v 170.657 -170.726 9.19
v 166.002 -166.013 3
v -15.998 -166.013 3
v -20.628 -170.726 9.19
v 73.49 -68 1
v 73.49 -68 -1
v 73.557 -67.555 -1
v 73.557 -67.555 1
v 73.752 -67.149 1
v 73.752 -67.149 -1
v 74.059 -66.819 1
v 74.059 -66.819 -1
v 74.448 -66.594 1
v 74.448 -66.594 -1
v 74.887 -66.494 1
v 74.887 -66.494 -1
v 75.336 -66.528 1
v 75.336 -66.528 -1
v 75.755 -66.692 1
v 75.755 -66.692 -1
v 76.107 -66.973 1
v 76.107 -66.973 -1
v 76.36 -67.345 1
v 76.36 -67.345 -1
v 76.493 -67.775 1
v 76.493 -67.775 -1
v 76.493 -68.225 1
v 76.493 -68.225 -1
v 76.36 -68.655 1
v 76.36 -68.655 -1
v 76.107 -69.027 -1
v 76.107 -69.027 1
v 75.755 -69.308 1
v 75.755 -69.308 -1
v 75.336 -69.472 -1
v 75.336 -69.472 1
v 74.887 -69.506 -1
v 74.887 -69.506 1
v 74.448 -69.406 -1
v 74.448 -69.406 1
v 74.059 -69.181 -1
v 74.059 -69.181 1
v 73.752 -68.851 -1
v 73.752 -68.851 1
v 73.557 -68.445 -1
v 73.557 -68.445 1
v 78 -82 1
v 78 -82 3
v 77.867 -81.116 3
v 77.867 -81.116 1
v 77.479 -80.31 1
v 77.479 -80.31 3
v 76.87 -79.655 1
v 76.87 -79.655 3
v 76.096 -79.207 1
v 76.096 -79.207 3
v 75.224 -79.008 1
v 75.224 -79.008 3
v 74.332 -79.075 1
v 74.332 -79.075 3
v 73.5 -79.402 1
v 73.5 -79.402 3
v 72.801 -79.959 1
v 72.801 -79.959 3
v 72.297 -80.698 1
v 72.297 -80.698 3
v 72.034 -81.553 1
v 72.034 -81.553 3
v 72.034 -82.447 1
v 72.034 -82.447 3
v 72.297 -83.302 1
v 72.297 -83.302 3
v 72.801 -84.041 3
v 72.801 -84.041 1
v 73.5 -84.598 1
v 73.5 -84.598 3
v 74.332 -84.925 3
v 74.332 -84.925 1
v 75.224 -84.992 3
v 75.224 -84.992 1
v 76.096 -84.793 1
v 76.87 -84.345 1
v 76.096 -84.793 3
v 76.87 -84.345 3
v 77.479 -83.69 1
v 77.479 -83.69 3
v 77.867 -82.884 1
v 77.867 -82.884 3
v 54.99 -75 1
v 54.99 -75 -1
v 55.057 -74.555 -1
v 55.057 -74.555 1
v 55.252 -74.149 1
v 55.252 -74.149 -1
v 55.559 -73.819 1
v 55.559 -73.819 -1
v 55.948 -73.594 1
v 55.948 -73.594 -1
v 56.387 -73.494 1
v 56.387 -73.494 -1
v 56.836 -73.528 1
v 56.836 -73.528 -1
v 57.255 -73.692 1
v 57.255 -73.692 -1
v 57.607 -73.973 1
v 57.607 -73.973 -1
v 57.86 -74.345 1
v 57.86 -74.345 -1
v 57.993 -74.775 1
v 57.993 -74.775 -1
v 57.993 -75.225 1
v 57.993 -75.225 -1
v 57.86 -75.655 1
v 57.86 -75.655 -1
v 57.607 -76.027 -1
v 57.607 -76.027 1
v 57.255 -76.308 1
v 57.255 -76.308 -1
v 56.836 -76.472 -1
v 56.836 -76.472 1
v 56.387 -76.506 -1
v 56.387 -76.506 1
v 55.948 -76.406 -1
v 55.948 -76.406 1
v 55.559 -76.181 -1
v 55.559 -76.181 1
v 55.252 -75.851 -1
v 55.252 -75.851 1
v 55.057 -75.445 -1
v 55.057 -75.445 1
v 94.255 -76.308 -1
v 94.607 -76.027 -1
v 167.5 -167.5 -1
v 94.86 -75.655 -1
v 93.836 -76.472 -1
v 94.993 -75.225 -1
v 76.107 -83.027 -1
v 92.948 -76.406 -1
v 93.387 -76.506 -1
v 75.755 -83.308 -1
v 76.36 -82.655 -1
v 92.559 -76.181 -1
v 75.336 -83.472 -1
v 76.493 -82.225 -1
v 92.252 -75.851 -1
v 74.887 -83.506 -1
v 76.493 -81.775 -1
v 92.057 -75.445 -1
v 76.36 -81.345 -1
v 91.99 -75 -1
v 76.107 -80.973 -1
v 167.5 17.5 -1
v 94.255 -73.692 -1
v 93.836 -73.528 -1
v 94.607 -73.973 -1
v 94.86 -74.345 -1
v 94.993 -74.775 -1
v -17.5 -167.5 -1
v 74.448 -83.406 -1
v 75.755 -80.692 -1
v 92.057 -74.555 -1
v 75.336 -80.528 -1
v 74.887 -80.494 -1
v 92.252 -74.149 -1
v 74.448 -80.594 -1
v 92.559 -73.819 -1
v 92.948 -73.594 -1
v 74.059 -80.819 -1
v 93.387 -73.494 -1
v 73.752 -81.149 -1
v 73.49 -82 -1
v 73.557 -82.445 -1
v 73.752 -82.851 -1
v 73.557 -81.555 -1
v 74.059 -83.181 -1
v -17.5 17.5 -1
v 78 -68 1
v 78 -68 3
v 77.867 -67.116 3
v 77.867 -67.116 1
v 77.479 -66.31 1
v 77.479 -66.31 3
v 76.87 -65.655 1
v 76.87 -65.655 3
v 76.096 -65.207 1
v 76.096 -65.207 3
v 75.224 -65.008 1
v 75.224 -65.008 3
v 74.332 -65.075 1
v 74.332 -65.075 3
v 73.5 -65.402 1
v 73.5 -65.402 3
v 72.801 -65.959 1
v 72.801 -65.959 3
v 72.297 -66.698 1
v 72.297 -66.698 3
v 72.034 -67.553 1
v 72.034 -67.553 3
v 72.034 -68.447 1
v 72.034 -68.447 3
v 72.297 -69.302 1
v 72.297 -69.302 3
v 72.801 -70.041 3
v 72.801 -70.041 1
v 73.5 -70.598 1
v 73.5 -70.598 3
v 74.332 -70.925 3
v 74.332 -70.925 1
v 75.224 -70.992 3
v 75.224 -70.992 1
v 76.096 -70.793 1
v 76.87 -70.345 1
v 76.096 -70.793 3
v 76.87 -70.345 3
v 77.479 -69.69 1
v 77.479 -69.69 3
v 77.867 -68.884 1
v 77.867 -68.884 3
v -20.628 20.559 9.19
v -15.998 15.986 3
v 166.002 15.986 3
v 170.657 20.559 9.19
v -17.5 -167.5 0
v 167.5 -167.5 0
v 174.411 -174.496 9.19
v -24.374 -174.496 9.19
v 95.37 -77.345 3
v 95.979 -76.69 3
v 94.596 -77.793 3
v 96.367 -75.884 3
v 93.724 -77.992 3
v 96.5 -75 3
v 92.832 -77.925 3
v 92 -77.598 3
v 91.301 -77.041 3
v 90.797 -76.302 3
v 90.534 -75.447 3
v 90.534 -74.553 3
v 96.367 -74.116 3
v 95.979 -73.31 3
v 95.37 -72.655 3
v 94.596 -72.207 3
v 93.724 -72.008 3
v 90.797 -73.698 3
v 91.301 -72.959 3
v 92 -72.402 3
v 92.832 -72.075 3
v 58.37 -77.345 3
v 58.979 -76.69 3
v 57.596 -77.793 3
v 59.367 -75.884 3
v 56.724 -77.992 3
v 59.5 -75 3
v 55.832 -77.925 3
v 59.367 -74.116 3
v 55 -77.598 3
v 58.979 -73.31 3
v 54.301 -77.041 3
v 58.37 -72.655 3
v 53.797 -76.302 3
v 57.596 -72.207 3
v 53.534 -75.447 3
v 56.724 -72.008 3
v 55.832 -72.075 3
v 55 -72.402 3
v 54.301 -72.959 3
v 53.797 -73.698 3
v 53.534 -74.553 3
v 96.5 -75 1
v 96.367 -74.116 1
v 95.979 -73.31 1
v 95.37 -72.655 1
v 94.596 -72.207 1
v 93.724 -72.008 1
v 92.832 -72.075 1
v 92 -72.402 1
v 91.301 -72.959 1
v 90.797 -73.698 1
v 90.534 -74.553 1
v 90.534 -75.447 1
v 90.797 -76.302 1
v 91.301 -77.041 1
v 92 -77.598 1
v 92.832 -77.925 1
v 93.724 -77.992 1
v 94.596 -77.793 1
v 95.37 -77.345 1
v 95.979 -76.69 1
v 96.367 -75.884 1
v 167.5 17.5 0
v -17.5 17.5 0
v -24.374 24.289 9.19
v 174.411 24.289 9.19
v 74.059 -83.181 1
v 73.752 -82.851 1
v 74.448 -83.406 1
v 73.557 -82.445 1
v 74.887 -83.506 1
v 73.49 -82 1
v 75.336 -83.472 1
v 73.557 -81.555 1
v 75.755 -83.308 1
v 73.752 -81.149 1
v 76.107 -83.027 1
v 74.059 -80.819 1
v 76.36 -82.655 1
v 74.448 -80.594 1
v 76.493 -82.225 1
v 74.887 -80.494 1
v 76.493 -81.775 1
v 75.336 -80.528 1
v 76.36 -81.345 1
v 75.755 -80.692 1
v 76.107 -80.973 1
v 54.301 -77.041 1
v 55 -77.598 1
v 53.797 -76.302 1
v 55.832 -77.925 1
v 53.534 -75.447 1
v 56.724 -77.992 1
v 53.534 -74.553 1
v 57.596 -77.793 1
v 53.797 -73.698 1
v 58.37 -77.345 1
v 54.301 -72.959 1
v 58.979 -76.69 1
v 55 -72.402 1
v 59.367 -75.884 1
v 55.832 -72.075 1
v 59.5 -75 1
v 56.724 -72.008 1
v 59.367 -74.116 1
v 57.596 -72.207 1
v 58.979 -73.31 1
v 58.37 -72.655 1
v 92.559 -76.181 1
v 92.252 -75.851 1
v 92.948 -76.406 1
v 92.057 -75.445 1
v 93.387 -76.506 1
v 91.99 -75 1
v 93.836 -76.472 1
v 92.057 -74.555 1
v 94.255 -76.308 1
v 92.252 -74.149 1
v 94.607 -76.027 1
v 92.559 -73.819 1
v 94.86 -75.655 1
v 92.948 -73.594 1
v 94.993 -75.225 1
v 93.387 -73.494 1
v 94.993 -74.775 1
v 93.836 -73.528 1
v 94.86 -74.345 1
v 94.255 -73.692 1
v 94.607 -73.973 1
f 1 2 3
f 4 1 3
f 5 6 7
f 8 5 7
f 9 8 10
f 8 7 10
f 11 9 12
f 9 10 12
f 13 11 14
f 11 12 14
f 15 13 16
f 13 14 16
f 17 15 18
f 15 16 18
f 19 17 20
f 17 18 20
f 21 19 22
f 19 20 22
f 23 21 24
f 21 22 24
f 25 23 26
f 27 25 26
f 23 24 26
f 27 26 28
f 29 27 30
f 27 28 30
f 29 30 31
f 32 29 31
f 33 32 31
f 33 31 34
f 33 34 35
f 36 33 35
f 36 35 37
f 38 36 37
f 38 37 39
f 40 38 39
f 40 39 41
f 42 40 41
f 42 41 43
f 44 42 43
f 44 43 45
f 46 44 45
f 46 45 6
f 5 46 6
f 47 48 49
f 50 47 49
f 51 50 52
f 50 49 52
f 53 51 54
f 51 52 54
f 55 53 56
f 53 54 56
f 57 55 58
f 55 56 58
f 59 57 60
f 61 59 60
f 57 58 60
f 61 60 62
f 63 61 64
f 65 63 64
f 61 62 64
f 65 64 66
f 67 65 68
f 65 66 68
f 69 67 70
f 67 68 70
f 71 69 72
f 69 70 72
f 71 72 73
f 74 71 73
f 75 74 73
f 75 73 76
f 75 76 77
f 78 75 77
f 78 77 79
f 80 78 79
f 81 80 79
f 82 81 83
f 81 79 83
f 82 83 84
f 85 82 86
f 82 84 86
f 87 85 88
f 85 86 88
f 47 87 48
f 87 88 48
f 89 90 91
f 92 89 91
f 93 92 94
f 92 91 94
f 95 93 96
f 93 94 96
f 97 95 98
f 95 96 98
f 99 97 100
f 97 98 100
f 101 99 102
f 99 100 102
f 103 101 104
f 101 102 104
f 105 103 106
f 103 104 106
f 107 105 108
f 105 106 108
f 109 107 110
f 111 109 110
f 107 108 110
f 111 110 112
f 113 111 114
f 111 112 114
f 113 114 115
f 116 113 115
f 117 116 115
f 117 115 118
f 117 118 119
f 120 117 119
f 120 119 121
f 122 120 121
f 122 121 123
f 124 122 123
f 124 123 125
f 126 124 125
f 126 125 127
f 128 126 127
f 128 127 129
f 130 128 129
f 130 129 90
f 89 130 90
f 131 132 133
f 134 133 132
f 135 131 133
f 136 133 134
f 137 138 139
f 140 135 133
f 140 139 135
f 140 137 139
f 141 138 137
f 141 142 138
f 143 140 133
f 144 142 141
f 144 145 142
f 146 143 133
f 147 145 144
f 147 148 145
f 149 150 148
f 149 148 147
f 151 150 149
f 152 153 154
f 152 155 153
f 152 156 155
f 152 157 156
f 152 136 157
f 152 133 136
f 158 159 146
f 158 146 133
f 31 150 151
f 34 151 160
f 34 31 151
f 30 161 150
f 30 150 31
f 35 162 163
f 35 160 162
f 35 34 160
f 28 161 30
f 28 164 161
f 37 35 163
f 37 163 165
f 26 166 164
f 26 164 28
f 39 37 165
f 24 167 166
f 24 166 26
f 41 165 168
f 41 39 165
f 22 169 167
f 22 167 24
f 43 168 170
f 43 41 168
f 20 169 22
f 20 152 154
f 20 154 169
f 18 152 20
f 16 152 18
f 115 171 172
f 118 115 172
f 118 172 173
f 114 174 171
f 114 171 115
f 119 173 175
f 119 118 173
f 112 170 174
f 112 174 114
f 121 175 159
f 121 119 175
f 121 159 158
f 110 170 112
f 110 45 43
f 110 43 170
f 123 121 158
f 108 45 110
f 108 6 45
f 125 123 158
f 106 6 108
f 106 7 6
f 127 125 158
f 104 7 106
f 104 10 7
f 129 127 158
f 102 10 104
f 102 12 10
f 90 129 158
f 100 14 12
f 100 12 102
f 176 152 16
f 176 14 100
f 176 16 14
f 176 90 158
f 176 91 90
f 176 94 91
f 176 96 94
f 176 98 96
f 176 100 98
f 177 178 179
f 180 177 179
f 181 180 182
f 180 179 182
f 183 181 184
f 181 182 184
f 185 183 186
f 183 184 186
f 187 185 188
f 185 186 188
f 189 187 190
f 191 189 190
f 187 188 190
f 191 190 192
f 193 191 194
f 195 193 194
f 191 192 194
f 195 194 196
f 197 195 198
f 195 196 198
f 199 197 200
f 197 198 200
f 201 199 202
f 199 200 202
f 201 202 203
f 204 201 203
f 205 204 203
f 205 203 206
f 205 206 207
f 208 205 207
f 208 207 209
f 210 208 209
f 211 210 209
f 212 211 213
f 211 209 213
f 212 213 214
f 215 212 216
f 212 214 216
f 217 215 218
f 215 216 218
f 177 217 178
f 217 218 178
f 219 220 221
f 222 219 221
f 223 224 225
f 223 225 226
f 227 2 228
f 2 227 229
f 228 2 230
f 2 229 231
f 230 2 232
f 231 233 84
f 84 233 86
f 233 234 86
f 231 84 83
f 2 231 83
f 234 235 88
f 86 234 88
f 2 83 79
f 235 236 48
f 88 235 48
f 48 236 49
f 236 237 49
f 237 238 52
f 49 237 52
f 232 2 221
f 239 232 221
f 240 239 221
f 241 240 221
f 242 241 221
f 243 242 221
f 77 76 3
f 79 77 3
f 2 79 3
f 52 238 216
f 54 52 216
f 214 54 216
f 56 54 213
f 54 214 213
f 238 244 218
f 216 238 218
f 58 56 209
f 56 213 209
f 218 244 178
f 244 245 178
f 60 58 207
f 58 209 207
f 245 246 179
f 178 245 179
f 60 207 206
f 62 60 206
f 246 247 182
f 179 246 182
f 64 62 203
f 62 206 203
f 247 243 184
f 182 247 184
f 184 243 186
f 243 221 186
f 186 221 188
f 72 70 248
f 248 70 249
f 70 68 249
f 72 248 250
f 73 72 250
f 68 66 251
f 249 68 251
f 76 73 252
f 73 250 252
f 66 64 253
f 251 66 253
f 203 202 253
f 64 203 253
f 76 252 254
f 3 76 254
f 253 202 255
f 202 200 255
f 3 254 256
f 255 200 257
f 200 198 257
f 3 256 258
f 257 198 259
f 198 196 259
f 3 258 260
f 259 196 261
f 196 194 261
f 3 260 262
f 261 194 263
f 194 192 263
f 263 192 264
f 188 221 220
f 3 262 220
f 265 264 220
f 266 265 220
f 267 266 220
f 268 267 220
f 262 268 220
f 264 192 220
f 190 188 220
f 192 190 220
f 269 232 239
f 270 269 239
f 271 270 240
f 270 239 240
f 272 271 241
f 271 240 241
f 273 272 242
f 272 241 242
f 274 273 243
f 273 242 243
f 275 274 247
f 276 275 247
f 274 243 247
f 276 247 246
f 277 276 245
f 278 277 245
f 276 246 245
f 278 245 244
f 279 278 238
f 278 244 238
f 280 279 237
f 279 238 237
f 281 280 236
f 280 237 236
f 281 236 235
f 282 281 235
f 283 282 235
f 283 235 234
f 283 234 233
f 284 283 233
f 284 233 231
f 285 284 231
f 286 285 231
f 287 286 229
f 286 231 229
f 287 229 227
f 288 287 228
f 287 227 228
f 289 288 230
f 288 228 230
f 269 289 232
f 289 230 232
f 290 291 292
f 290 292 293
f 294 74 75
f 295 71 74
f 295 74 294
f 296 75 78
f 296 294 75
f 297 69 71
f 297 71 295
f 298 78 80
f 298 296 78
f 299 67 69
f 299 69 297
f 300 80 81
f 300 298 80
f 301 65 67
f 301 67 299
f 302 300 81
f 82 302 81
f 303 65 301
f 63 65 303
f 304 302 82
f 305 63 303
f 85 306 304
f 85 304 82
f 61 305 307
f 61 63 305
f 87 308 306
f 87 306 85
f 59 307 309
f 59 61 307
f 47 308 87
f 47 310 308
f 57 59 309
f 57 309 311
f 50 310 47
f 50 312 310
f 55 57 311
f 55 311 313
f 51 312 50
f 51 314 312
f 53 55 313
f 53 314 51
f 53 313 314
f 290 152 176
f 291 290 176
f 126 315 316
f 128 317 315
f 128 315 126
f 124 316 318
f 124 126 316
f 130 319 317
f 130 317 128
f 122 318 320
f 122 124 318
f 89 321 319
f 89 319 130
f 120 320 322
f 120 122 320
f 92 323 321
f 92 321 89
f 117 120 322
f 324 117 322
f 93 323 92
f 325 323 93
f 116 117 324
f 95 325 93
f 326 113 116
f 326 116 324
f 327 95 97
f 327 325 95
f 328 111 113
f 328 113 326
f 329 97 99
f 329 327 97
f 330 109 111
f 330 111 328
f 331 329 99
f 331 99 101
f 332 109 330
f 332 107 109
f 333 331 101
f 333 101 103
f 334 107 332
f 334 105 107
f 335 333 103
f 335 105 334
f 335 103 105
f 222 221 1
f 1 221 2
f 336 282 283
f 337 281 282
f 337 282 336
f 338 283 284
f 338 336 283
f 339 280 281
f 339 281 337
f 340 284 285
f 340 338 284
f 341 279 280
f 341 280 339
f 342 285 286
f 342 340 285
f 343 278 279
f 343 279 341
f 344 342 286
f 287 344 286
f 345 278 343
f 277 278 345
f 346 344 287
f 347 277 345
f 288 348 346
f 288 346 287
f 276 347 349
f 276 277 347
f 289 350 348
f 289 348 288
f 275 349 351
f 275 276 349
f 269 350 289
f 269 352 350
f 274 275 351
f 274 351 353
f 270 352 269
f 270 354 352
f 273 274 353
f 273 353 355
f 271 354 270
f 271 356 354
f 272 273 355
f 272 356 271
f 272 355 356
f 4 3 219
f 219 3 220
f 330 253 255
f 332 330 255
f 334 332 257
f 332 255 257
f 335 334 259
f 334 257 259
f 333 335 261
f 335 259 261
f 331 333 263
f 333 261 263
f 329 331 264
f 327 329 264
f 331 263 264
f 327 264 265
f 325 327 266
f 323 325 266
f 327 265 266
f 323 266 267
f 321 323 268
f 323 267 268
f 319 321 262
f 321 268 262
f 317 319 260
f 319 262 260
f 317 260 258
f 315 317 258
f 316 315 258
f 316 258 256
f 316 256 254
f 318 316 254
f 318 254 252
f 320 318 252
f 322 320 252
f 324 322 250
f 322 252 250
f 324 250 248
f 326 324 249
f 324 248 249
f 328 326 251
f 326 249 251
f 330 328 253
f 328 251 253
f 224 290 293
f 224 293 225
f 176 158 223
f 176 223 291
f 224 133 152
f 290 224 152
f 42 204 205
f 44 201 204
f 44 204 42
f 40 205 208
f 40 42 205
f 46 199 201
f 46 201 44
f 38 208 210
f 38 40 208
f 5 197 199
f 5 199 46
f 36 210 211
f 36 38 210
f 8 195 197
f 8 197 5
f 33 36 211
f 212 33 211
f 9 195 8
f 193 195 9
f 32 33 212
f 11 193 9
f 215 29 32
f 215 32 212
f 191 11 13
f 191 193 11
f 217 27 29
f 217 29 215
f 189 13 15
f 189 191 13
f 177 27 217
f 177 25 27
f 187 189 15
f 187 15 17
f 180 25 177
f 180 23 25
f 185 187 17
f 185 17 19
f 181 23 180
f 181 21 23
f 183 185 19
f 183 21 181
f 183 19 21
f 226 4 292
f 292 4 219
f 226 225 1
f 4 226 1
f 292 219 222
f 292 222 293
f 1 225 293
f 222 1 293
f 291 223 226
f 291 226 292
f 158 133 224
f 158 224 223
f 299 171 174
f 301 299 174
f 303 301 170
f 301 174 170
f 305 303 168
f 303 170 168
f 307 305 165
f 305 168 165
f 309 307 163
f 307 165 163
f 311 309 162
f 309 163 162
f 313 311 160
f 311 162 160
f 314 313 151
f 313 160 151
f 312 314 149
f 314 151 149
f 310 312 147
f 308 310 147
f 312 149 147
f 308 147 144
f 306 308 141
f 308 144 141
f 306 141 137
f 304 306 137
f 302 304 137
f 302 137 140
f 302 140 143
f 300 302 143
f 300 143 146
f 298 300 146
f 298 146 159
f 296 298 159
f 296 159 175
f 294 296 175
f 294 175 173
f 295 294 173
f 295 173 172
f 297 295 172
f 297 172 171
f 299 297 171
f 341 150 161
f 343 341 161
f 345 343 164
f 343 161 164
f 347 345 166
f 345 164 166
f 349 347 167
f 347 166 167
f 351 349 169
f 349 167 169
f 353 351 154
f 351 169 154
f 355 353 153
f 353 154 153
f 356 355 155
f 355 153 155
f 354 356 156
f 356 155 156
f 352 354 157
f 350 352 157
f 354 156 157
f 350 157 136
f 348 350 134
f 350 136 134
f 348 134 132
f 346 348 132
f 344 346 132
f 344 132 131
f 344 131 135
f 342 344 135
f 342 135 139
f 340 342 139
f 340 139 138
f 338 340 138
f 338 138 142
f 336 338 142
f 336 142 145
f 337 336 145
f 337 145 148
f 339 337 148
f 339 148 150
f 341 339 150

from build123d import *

# Parameters (mm, degrees)
SHELL_2_T            = -3
SKETCH_4_R           = 1.5
CUT_EXTRUDE_1_DEPTH  = 10
EXTRUDE_1_DEPTH      = 40.5
CUT_EXTRUDE_2_DEPTH  = 100
SKETCH_8_R           = 1.5
EXTRUDE_2_DEPTH      = 3
EXTRUDE_3_DEPTH      = 4
EXTRUDE_4_DEPTH      = 4
SKETCH_11_W          = 56.2
SKETCH_11_H          = 25
CUT_EXTRUDE_3_DEPTH  = 4
SKETCH_12_W          = 3
SKETCH_12_H          = 215
EXTRUDE_5_DEPTH      = 10
SKETCH_13_W          = 10
SKETCH_13_H          = 215
CUT_EXTRUDE_4_DEPTH  = 300
SKETCH_15_W          = 116.702064096
SKETCH_15_H          = 65.174269722
SKETCH_15_W_2        = 111.85
SKETCH_15_H_2        = 80
CUT_EXTRUDE_5_DEPTH  = 4
SKETCH_16_W          = 185
SKETCH_16_H          = 185
EXTRUDE_6_DEPTH      = 4
SKETCH_17_W          = 56.2
SKETCH_17_H          = 25
CUT_EXTRUDE_6_DEPTH  = 4
EXTRUDE_7_DEPTH      = 4
SKETCH_20_R          = 1.5
CUT_EXTRUDE_7_DEPTH  = 10
SKETCH_21_W          = 185
SKETCH_21_H          = 185
CUT_EXTRUDE_8_DEPTH  = 37.5
EXTRUDE_START        = 1
SKETCH_22_W          = 185
SKETCH_22_H          = 185
SKETCH_22_R          = 1.5
EXTRUDE_8_DEPTH      = 1
CUT_EXTRUDE_START    = -2
SKETCH_24_R          = 3
SKETCH_24_R_2        = 1.5
CUT_EXTRUDE_9_DEPTH  = 2
SKETCH_25_R          = 1.51
CUT_EXTRUDE_10_DEPTH = 10
SKETCH_26_R          = 1.5
EXTRUDE_9_DEPTH      = 4
EXTRUDE_START_2      = -4
SKETCH_28_R          = 3
EXTRUDE_10_DEPTH     = 4
SKETCH_29_R          = 3
CUT_EXTRUDE_11_DEPTH = 2
CUT_EXTRUDE_12_DEPTH = 10
CUT_EXTRUDE_13_DEPTH = 10
CUT_EXTRUDE_14_DEPTH = 10
CUT_EXTRUDE_15_DEPTH = 10
CUT_EXTRUDE_19_DEPTH = 200
CUT_EXTRUDE_20_DEPTH = 200


with BuildPart() as part:
    # 草图3 → 放样1 section 0
    with BuildSketch(Plane.XY.offset(20)):
        with BuildLine():
            Line((-32.460246779, 32.274755465), (182.539753221, 32.274755465))
            Line((182.539753221, 32.274755465), (182.539753221, -182.725244535))
            Line((182.539753221, -182.725244535), (-32.460246779, -182.725244535))
            Line((-32.460246779, -182.725244535), (-32.460246779, 32.274755465))
        make_face()
    # 草图1 → 放样1 section 1
    with BuildSketch(Plane.XY):
        with BuildLine():
            Line((-17.5, -167.5), (167.5, -167.5))
            Line((167.5, -167.5), (167.5, 17.5))
            Line((167.5, 17.5), (-17.5, 17.5))
            Line((-17.5, 17.5), (-17.5, -167.5))
        make_face()
    loft()

    # 抽壳2
    shell_2_openings = [part.faces().sort_by_distance(p)[0] for p in [
        (75.039753221, -75.225244535, 20),
    ]]
    offset(amount=SHELL_2_T, openings=shell_2_openings, kind=Kind.INTERSECTION)

    # 草图4 → 切除-拉伸1 (cut)
    with BuildSketch(Plane.XY.offset(3)):
        with BuildLine():
            ThreePointArc((86.25, -75.225244535), (84.75, -73.725244535), (83.25, -75.225244535))
            Line((83.25, -75.225244535), (86.25, -75.225244535))
        make_face()
        with BuildLine():
            Line((86.25, -75.225244535), (83.25, -75.225244535))
            ThreePointArc((83.25, -75.225244535), (84.75, -76.725244535), (86.25, -75.225244535))
        make_face()
        with Locations((66.25, -82.225244535)):
            Circle(SKETCH_4_R)
        with BuildLine():
            ThreePointArc((74.75, -75.225244535), (73.25, -73.725244535), (71.75, -75.225244535))
            Line((71.75, -75.225244535), (74.75, -75.225244535))
        make_face()
        with BuildLine():
            Line((74.75, -75.225244535), (71.75, -75.225244535))
            ThreePointArc((71.75, -75.225244535), (73.25, -76.725244535), (74.75, -75.225244535))
        make_face()
        with Locations((66.25, -68.225244535)):
            Circle(SKETCH_4_R)
        with BuildLine():
            ThreePointArc((60.75, -75.225244535), (59.25, -73.725244535), (57.75, -75.225244535))
            Line((57.75, -75.225244535), (60.75, -75.225244535))
        make_face()
        with BuildLine():
            Line((60.75, -75.225244535), (57.75, -75.225244535))
            ThreePointArc((57.75, -75.225244535), (59.25, -76.725244535), (60.75, -75.225244535))
        make_face()
        with BuildLine():
            ThreePointArc((49.25, -75.225244535), (47.75, -73.725244535), (46.25, -75.225244535))
            Line((46.25, -75.225244535), (49.25, -75.225244535))
        make_face()
        with BuildLine():
            Line((49.25, -75.225244535), (46.25, -75.225244535))
            ThreePointArc((46.25, -75.225244535), (47.75, -76.725244535), (49.25, -75.225244535))
        make_face()
    extrude(amount=-CUT_EXTRUDE_1_DEPTH, mode=Mode.SUBTRACT)

    # 草图6 → 凸台-拉伸1 (add)
    with BuildSketch(Plane.XY.offset(3)):
        Polygon((38.15, -62.5), (34.15, -62.5), (31.15, -62.5), (31.15, -65.5), (34.15, -65.5), (34.15, -84.5), (31.15, -84.5), (31.15, -87.5), (34.15, -87.5), (38.15, -87.5), (38.15, -75), align=None)
        Polygon((94.35, -75), (94.35, -62.5), (98.35, -62.5), (101.35, -62.5), (101.35, -65.5), (98.35, -65.5), (98.35, -84.5), (101.35, -84.5), (101.35, -87.5), (98.35, -87.5), (94.35, -87.5), align=None)
    extrude(amount=-EXTRUDE_1_DEPTH)

    # 草图7 → 切除-拉伸2 (cut)
    with BuildSketch(Plane(origin=(98.35, 0, 0), x_dir=(0, 0, -1), z_dir=(1, 0, 0))):
        with BuildLine():
            ThreePointArc((18.01, -75), (16.5, -73.49), (14.99, -75))
            Line((14.99, -75), (16.5, -75))
            Line((16.5, -75), (18.01, -75))
        make_face()
        with BuildLine():
            Line((16.5, -75), (14.99, -75))
            ThreePointArc((14.99, -75), (16.5, -76.51), (18.01, -75))
            Line((18.01, -75), (16.5, -75))
        make_face()
        with BuildLine():
            ThreePointArc((35.01, -75), (33.5, -73.49), (31.99, -75))
            Line((31.99, -75), (33.5, -75))
            Line((33.5, -75), (35.01, -75))
        make_face()
        with BuildLine():
            Line((33.5, -75), (31.99, -75))
            ThreePointArc((31.99, -75), (33.5, -76.51), (35.01, -75))
            Line((35.01, -75), (33.5, -75))
        make_face()
    extrude(amount=-CUT_EXTRUDE_2_DEPTH, mode=Mode.SUBTRACT)

    # 草图8 → 凸台-拉伸2 (add)
    with BuildSketch(Plane.XY.offset(3)):
        with Locations((66.25, -68.225244535)):
            Circle(SKETCH_8_R)
        with Locations((59.25, -75.225244535)):
            Circle(SKETCH_8_R)
        with Locations((47.75, -75.225244535)):
            Circle(SKETCH_8_R)
        with Locations((73.25, -75.225244535)):
            Circle(SKETCH_8_R)
        with Locations((84.75, -75.225244535)):
            Circle(SKETCH_8_R)
        with Locations((66.25, -82.225244535)):
            Circle(SKETCH_8_R)
    extrude(amount=-EXTRUDE_2_DEPTH)

    # 草图9 → 凸台-拉伸3 (add)
    with BuildSketch(Plane(origin=(0, 0, 0), x_dir=(-1, 0, 0), z_dir=(0, 0, -1))):
        Polygon((-73.585786438, -76.414213562), (0, -2.828427125), (0, 0), (-2.828427125, 0), (-72.748638048, -69.920210924), (-150, -147.171572875), (-150, -150), (-147.171572875, -150), align=None)
    extrude(amount=EXTRUDE_3_DEPTH)

    # 草图10 → 凸台-拉伸4 (add)
    with BuildSketch(Plane(origin=(0, 0, 0), x_dir=(-1, 0, 0), z_dir=(0, 0, -1))):
        Polygon((-106.669297814, -40.502275062), (-147.171572875, 17.5), (-167.5, 17.5), (-167.5, 34.342276425), (-121.973814525, -30.8546126), (-26.55602168, -167.5), (17.5, -167.5), (17.5, -218.321959389), align=None)
    extrude(amount=EXTRUDE_4_DEPTH)

    # 草图11 → 切除-拉伸3 (cut)
    with BuildSketch(Plane(origin=(0, 0, -4), x_dir=(-1, 0, 0), z_dir=(0, 0, -1))):
        with Locations((-66.25, -75)):
            Rectangle(SKETCH_11_W, SKETCH_11_H)
    extrude(amount=-CUT_EXTRUDE_3_DEPTH, mode=Mode.SUBTRACT)


with BuildPart() as body_2:
    # 草图12 → 凸台-拉伸5 (new body)
    with BuildSketch(Plane.XY.offset(20)):
        with Locations((184.039753221, -75.225244535)):
            Rectangle(SKETCH_12_W, SKETCH_12_H)
    extrude(amount=-EXTRUDE_5_DEPTH)


with BuildPart() as cut_extrude_4_tool:
    # 草图13 → 切除-拉伸4 (new body)
    with BuildSketch(Plane(origin=(185.539753221, 0, 0), x_dir=(0, 0, -1), z_dir=(1, 0, 0))):
        with Locations((-15, -75.225244535)):
            Rectangle(SKETCH_13_W, SKETCH_13_H)
    extrude(amount=-CUT_EXTRUDE_4_DEPTH)


with BuildPart() as part_1:
    add(part.part)

    # 切除-拉伸4: cut by cut_extrude_4_tool
    add(cut_extrude_4_tool.part, mode=Mode.SUBTRACT)

    # 草图15 → 切除-拉伸5 (cut)
    with BuildSketch(Plane(origin=(0, 0, -4), x_dir=(-1, 0, 0), z_dir=(0, 0, -1))):
        with Locations((-96.501032048, -120.087134861)):
            Rectangle(SKETCH_15_W, SKETCH_15_H)
        with Locations((-38.425, -22.5)):
            Rectangle(SKETCH_15_W_2, SKETCH_15_H_2)
    extrude(amount=-CUT_EXTRUDE_5_DEPTH, mode=Mode.SUBTRACT)

    # 草图16 → 凸台-拉伸6 (add)
    with BuildSketch(Plane(origin=(0, 0, 0), x_dir=(-1, 0, 0), z_dir=(0, 0, -1))):
        with Locations((-75, -75)):
            Rectangle(SKETCH_16_W, SKETCH_16_H)
        Polygon((-94.35, -62.5), (-94.35, -70.413972806), (-99.876229843, -62.5), align=None, mode=Mode.SUBTRACT)
        Polygon((-31.15, -62.5), (-31.15, -65.5), (-34.15, -65.5), (-34.15, -84.5), (-31.15, -84.5), (-31.15, -87.5), (-38.15, -87.5), (-38.15, -62.5), align=None, mode=Mode.SUBTRACT)
    extrude(amount=EXTRUDE_6_DEPTH)

    # 草图17 → 切除-拉伸6 (cut)
    with BuildSketch(Plane(origin=(0, 0, 0), x_dir=(-1, 0, 0), z_dir=(0, 0, -1))):
        with Locations((-66.25, -75)):
            Rectangle(SKETCH_17_W, SKETCH_17_H)
    extrude(amount=CUT_EXTRUDE_6_DEPTH, mode=Mode.SUBTRACT)

    # 草图18 → 凸台-拉伸7 (add)
    with BuildSketch(Plane(origin=(0, 0, 0), x_dir=(-1, 0, 0), z_dir=(0, 0, -1))):
        Polygon((-75, -119.25), (-33.578427125, -119.25), (-31.578427125, -121.25), (-29.578427125, -123.25), (-75, -123.25), (-120.421572875, -123.25), (-116.421572875, -119.25), align=None)
        Polygon((-119.25, -75), (-119.25, -116.421572875), (-121.25, -118.421572875), (-123.25, -120.421572875), (-123.25, -75), (-123.25, -29.578427125), (-119.25, -33.578427125), align=None)
        Polygon((-75, -30.75), (-116.421572875, -30.75), (-120.421572875, -26.75), (-75, -26.75), (-29.578427125, -26.75), (-33.578427125, -30.75), align=None)
        Polygon((-30.75, -33.578427125), (-26.75, -29.578427125), (-26.75, -75), (-26.75, -120.421572875), (-30.75, -116.421572875), (-30.75, -75), align=None)
    extrude(amount=EXTRUDE_7_DEPTH)

    # 草图20 → 切除-拉伸7 (cut)
    with BuildSketch(Plane(origin=(0, 0, 0), x_dir=(-1, 0, 0), z_dir=(0, 0, -1))):
        with Locations((-84.75, -75)):
            Circle(SKETCH_20_R)
        with Locations((-47.75, -75)):
            Circle(SKETCH_20_R)
        with Locations((-66.25, -68)):
            Circle(SKETCH_20_R)
        with Locations((-66.25, -82)):
            Circle(SKETCH_20_R)
    extrude(amount=-CUT_EXTRUDE_7_DEPTH, mode=Mode.SUBTRACT)

    # 草图21 → 切除-拉伸8 (cut)
    with BuildSketch(Plane(origin=(0, 0, -37.5), x_dir=(-1, 0, 0), z_dir=(0, 0, -1))):
        with Locations((-75, -75)):
            Rectangle(SKETCH_21_W, SKETCH_21_H)
    extrude(amount=-CUT_EXTRUDE_8_DEPTH, mode=Mode.SUBTRACT)

    # 草图22 → 凸台-拉伸8 (add)
    with BuildSketch(Plane(origin=(0, 0, 0), x_dir=(-1, 0, 0), z_dir=(0, 0, -1)).offset(EXTRUDE_START)):
        with Locations((-75, -75)):
            Rectangle(SKETCH_22_W, SKETCH_22_H)
        with Locations((-66.25, -68)):
            Circle(SKETCH_22_R, mode=Mode.SUBTRACT)
        with Locations((-66.25, -82)):
            Circle(SKETCH_22_R, mode=Mode.SUBTRACT)
        with Locations((-84.75, -75)):
            Circle(SKETCH_22_R, mode=Mode.SUBTRACT)
        with Locations((-47.75, -75)):
            Circle(SKETCH_22_R, mode=Mode.SUBTRACT)
    extrude(amount=-EXTRUDE_8_DEPTH)

    # 草图24 → 切除-拉伸9 (cut)
    # profile 1 of 4: a face of its own
    with BuildSketch(Plane.XY.offset(3).offset(CUT_EXTRUDE_START)):
        with Locations((66.25, -68)):
            Circle(SKETCH_24_R)
        with Locations((66.25, -68)):
            Circle(SKETCH_24_R_2, mode=Mode.SUBTRACT)
    # profile 2 of 4: a face of its own
    with BuildSketch(Plane.XY.offset(3).offset(CUT_EXTRUDE_START)):
        with Locations((66.25, -82)):
            Circle(SKETCH_24_R)
        with Locations((66.25, -82)):
            Circle(SKETCH_24_R_2, mode=Mode.SUBTRACT)
    # profile 3 of 4: a face of its own
    with BuildSketch(Plane.XY.offset(3).offset(CUT_EXTRUDE_START)):
        with Locations((84.75, -75)):
            Circle(SKETCH_24_R)
        with Locations((84.75, -75)):
            Circle(SKETCH_24_R_2, mode=Mode.SUBTRACT)
    # profile 4 of 4: a face of its own
    with BuildSketch(Plane.XY.offset(3).offset(CUT_EXTRUDE_START)):
        with Locations((47.75, -75)):
            Circle(SKETCH_24_R)
    extrude(amount=CUT_EXTRUDE_9_DEPTH, mode=Mode.SUBTRACT)

    # 草图25 → 切除-拉伸10 (cut)
    with BuildSketch(Plane(origin=(0, 0, -1), x_dir=(-1, 0, 0), z_dir=(0, 0, -1))):
        with Locations((-75, -68)):
            Circle(SKETCH_25_R)
        with Locations((-75, -82)):
            Circle(SKETCH_25_R)
        with Locations((-93.5, -75)):
            Circle(SKETCH_25_R)
        with Locations((-56.5, -75)):
            Circle(SKETCH_25_R)
    extrude(amount=-CUT_EXTRUDE_10_DEPTH, mode=Mode.SUBTRACT)

    # 草图26 → 凸台-拉伸9 (add)
    with BuildSketch(Plane(origin=(0, 0, -1), x_dir=(-1, 0, 0), z_dir=(0, 0, -1))):
        with Locations((-84.75, -75)):
            Circle(SKETCH_26_R)
        with Locations((-66.25, -68)):
            Circle(SKETCH_26_R)
        with Locations((-66.25, -82)):
            Circle(SKETCH_26_R)
        with Locations((-47.75, -75)):
            Circle(SKETCH_26_R)
    extrude(amount=-EXTRUDE_9_DEPTH)

    # 草图28 → 凸台-拉伸10 (add)
    with BuildSketch(Plane.XY.offset(3).offset(EXTRUDE_START_2)):
        with Locations((84.75, -75)):
            Circle(SKETCH_28_R)
        with Locations((66.25, -68)):
            Circle(SKETCH_28_R)
        with Locations((47.75, -75)):
            Circle(SKETCH_28_R)
        with Locations((66.25, -82)):
            Circle(SKETCH_28_R)
    extrude(amount=EXTRUDE_10_DEPTH)

    # 草图29 → 切除-拉伸11 (cut)
    with BuildSketch(Plane.XY.offset(3)):
        with Locations((75, -68)):
            Circle(SKETCH_29_R)
        with Locations((75, -82)):
            Circle(SKETCH_29_R)
        with Locations((93.5, -75)):
            Circle(SKETCH_29_R)
        with Locations((56.5, -75)):
            Circle(SKETCH_29_R)
    extrude(amount=-CUT_EXTRUDE_11_DEPTH, mode=Mode.SUBTRACT)

    # 草图30 → 切除-拉伸12 (cut)
    with BuildSketch(Plane(origin=(-11.221383762, 0, -8.393733514), x_dir=(-0.5989808600970753, 0, 0.8007633415918638), z_dir=(-0.8007633415918638, 0, -0.5989808600970753))):
        Polygon((21.970249209, 24.295823605), (22.970249209, 24.887377733), (22.970249209, 25.521543856), (21.970249209, 25.521543856), align=None)
        Polygon((21.970249209, 23.212591773), (22.970249209, 23.212591773), (22.970249209, 24.887377733), (21.970249209, 24.295823605), align=None)
        Polygon((22.970249209, -175.112622267), (22.970249209, 23.212591773), (21.970249209, 23.212591773), (21.970249209, -174.503031383), align=None)
        Polygon((24.472936447, 23.212591773), (22.970249209, 23.212591773), (22.970249209, -175.112622267), (21.970249209, -174.503031383), (21.970249209, -177.376097461), (24.472936447, -177.376097461), align=None)
    extrude(amount=-CUT_EXTRUDE_12_DEPTH, mode=Mode.SUBTRACT)

    # 草图31 → 切除-拉伸13 (cut)
    with BuildSketch(Plane(origin=(0, 11.321485901, -8.363609284), x_dir=(1, 0, 0), z_dir=(0, 0.804327079908719, -0.5941867959871823))):
        Polygon((-9.362751303, -26.365830403), (-9.362751303, -22.831022035), (-23.310620962, -22.831022035), (-24.381142529, -21.835452742), (-24.378476809, -21.831022035), (-28.997349139, -21.831022035), (-28.997349139, -26.365830403), align=None)
        Polygon((175.01987661, -22.831022035), (-9.362751303, -22.831022035), (-9.362751303, -26.365830403), (-9.362751303, -29.913680828), (184.828261885, -29.913680828), (184.828261885, -21.831022035), (174.415032571, -21.831022035), align=None)
        Polygon((-23.310620962, -22.831022035), (-9.362751303, -22.831022035), (-9.362751303, -21.831022035), (-24.378476809, -21.831022035), (-24.381142529, -21.835452742), align=None)
        Polygon((-9.362751303, -21.831022035), (-9.362751303, -22.831022035), (175.01987661, -22.831022035), (174.415032571, -21.831022035), align=None)
    extrude(amount=-CUT_EXTRUDE_13_DEPTH, mode=Mode.SUBTRACT)

    # 草图32 → 切除-拉伸14 (cut)
    with BuildSketch(Plane(origin=(106.995565381, 0, -80.459344952), x_dir=(-0.6010162270612195, 0, -0.7992368202285832), z_dir=(0.7992368202285832, 0, -0.6010162270612195))):
        Polygon((-120.009855749, -69.723738659), (-113.182154103, -69.723738659), (-113.182154103, 23.204405296), (-112.182154103, 24.286300454), (-112.182154103, 28.147322854), (-120.009855749, 28.147322854), align=None)
        Polygon((-113.182154103, 23.204405296), (-113.182154103, -69.723738659), (-112.182154103, -69.723738659), (-112.182154103, 24.286300454), align=None)
        Polygon((-113.182154103, -175.112622267), (-113.182154103, -69.723738659), (-120.009855749, -69.723738659), (-120.009855749, -178.276095982), (-112.182154103, -178.276095982), (-112.182154103, -174.504193466), align=None)
        Polygon((-112.182154103, -69.723738659), (-113.182154103, -69.723738659), (-113.182154103, -175.112622267), (-112.182154103, -174.504193466), align=None)
    extrude(amount=-CUT_EXTRUDE_14_DEPTH, mode=Mode.SUBTRACT)

    # 草图33 → 切除-拉伸15 (cut)
    with BuildSketch(Plane(origin=(0, -106.044862451, -80.727948124), x_dir=(1, 0, 0), z_dir=(0, -0.7956781110640406, -0.6057196905942221))):
        Polygon((69.393478745, 118.677029152), (69.393478745, 114.02594449), (173.356028024, 114.02594449), (174.41412798, 113.02594449), (179.725148275, 113.02594449), (179.725148275, 118.677029152), align=None)
        Polygon((-23.310620962, 114.02594449), (69.393478745, 114.02594449), (69.393478745, 118.677029152), (69.393478745, 127.996312104), (-31.968712938, 127.996312104), (-31.968712938, 113.02594449), (-24.374344205, 113.02594449), align=None)
        Polygon((69.393478745, 113.02594449), (69.393478745, 114.02594449), (-23.310620962, 114.02594449), (-24.374344205, 113.02594449), align=None)
        Polygon((173.356028024, 114.02594449), (69.393478745, 114.02594449), (69.393478745, 113.02594449), (174.41412798, 113.02594449), align=None)
    extrude(amount=-CUT_EXTRUDE_15_DEPTH, mode=Mode.SUBTRACT)

    # 草图36 → 切除-拉伸19 (cut)
    with BuildSketch(Plane.ZY.offset(17.5)):
        Polygon((10.043413086, 23.204405296), (10, 23.204405296), (9.19, 23.204405296), (9.19, -174.807653439), (10.859055114, -174.807653439), (10.859055114, 23.204405296), align=None)
        Polygon((9.19, 23.204405296), (10, 23.204405296), (10.043413086, 23.204405296), (10.043413086, 24.45758786), (9.19, 24.45758786), align=None)
    extrude(amount=-CUT_EXTRUDE_19_DEPTH, mode=Mode.SUBTRACT)

    # 草图37 → 切除-拉伸20 (cut)
    with BuildSketch(Plane(origin=(-17.5, 0, 0), x_dir=(0, 0, -1), z_dir=(1, 0, 0))):
        Polygon((-9.204321889, -174.506902577), (-10, -173.461693603), (-10.120495689, -173.461693603), (-10.120495689, -174.637630453), (-9.19, -174.637630453), (-9.19, -174.495999864), align=None)
        Polygon((-9.19, -173.461693603), (-10, -173.461693603), (-9.204321889, -174.506902577), (-9.19, -174.495999864), align=None)
        Polygon((-10, -171.342253373), (-10, -173.461693603), (-9.19, -173.461693603), (-9.19, -170.725630969), align=None)
        Polygon((-10.120495689, -173.461693603), (-10, -173.461693603), (-10, -171.342253373), (-9.19, -170.725630969), (-9.19, 24.422433595), (-10.120495689, 24.422433595), align=None)
    extrude(amount=-CUT_EXTRUDE_20_DEPTH, mode=Mode.SUBTRACT)


with BuildPart() as body_2_1:
    add(body_2.part)

    # 切除-拉伸4: cut by cut_extrude_4_tool
    add(cut_extrude_4_tool.part, mode=Mode.SUBTRACT)


solid = part_1.part
